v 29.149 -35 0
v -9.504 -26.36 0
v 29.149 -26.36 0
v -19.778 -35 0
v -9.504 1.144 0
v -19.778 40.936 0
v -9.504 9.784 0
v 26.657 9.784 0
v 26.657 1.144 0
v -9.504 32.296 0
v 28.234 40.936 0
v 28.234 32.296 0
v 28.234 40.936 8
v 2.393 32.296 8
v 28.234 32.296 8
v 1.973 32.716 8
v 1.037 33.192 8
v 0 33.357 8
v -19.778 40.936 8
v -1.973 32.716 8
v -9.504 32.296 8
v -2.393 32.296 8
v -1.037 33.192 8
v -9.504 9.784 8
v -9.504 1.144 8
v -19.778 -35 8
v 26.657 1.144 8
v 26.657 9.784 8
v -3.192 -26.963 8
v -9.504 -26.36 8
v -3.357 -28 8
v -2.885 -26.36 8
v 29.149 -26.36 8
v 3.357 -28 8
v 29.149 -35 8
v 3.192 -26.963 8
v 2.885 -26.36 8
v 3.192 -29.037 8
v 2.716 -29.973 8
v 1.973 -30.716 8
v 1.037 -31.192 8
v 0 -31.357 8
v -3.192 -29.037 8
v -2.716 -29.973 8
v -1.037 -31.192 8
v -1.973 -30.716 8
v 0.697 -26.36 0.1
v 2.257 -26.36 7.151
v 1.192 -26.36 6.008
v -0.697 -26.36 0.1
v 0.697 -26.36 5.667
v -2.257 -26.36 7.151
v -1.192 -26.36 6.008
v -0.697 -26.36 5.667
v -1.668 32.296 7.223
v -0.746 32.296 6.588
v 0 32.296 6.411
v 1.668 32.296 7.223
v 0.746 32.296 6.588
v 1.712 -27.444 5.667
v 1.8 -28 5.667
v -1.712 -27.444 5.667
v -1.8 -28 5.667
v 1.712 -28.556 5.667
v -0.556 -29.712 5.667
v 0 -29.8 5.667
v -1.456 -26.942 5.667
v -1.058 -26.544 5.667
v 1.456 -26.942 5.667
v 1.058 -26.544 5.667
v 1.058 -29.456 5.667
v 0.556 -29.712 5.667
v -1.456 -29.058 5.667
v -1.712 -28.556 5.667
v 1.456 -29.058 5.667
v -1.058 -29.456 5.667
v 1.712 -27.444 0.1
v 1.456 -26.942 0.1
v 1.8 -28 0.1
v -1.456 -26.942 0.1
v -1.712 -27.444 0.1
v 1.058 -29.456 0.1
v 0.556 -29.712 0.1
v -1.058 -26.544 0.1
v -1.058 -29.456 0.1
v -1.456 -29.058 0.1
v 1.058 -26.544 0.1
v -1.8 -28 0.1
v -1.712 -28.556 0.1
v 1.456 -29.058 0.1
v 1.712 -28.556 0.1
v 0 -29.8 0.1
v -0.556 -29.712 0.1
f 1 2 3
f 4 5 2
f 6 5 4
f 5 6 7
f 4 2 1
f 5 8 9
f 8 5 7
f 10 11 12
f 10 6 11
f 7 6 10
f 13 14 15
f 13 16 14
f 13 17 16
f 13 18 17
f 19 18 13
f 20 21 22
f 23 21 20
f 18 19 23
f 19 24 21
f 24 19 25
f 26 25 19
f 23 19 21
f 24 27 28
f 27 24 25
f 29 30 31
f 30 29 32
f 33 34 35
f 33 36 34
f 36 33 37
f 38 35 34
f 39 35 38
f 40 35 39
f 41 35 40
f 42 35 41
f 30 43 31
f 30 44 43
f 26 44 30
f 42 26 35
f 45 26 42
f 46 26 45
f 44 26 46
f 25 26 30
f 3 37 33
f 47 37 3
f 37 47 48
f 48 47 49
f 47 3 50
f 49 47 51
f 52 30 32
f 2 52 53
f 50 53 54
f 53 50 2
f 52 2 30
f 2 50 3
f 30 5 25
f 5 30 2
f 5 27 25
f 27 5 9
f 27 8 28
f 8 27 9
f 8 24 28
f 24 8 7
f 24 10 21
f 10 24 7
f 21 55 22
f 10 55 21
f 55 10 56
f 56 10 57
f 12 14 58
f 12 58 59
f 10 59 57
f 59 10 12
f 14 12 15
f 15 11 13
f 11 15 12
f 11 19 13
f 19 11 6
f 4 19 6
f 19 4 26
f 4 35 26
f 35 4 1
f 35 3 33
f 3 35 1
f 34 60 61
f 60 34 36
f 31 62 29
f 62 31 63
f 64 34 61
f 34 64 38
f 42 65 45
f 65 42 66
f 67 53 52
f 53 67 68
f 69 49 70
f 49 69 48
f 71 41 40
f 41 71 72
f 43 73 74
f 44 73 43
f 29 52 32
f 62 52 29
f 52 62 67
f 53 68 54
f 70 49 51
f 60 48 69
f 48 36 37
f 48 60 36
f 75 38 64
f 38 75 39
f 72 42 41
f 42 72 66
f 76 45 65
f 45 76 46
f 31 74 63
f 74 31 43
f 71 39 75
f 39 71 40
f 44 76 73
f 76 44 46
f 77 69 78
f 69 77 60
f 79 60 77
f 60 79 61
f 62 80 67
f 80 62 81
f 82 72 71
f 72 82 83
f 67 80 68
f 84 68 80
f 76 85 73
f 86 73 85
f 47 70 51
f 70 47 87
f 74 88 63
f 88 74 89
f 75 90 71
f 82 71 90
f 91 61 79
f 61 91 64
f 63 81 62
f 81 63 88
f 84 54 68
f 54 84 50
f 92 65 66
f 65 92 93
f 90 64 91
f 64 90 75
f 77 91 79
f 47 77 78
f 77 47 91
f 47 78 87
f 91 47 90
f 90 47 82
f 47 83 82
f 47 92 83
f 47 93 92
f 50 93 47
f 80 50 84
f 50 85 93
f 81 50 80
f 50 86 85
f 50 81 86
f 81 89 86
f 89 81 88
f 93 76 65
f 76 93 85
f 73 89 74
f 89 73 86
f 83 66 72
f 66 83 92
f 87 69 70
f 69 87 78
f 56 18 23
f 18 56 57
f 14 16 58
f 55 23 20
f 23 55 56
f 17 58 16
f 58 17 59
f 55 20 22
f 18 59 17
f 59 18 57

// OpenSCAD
// Street Numbers for 3D printing
// Charles Tilford, 2019
// License: CC BY-NC-SA 4.0
//   https://creativecommons.org/licenses/by-nc-sa/4.0/

char="E";     // The number/letter to print

// Units are in mm, except for height of letter

// How many inches high should letter be?
inchesHigh=3;
// How thick/deep should letter be (mm)?
depth=8;

// Character coordinates just center the letter
charX=-30;    // Character X coord
charY=-35;    // Character Y coord
topScrew=30;  // Top screw Y coord
botScrew=-28; // Bottom screw Y coord
height=8;     // Thickness of character
// Screw dimensions. Default presumes
// #6 sheet metal screw
screwWid=3.6; // Width of screw shaft
screwTop=6.78;// Width of screw head
screwCon=5.08;// Height of head 'cone'

// Font to print in. Your system needs this
// installed, of course. If changed the hole
// positions almost certainly need to be
// changed, and maybe charX/charY.
fName="Open Sans Extrabold";
// https://fonts.google.com/specimen/Open+Sans
// Designer: Steve Matteson

// Thin floor below holes. My printer was
// struggling to have the hole 'border' stick
// to the stage. Just drill/screw thru it.
holeFloor=0.1; 

// ==========================================
// ===== All values below are auto-calculated
// ==========================================

// Scaled values
scaleFactor=inchesHigh / 3;
cX=charX * scaleFactor;
cY=charY * scaleFactor;
tS=topScrew * scaleFactor;
bS=botScrew * scaleFactor;
// Where do we start drawing screw head cone?
oS=depth - (screwCon-.05);

difference() {
  // We use difference() to punch out the screw holes
  // in the character
    
  // The character itself, 8mm thick
  translate([cX,cY,0])
    linear_extrude(height=depth, scale=1)
    text(char, size=(75*scaleFactor),
         $fn=100, font=fName);
    
  // Bottom screw hole
  translate([0,bS,oS]) color("red")
    cylinder(h=screwCon, d2=screwTop,
             d1=0, $fn=20);
   translate([0,bS,holeFloor])
    cylinder(h=20, d=screwWid, $fn=20);
    
  // Top screw hole
  translate([0,tS,oS]) color("red")
    cylinder(h=screwCon, d2=screwTop,
             d1=0, $fn=20);
  translate([0,tS,holeFloor])
    cylinder(h=20, d=screwWid, $fn=20);
}

// Colors are just to aid visualization of
// void spaces. $fn is "featuer number", ie how
// many polygons are devoted to object. The values
// above should be near your printing limit anyway.

// Developed in OpenSCAD
//    https://www.openscad.org/
